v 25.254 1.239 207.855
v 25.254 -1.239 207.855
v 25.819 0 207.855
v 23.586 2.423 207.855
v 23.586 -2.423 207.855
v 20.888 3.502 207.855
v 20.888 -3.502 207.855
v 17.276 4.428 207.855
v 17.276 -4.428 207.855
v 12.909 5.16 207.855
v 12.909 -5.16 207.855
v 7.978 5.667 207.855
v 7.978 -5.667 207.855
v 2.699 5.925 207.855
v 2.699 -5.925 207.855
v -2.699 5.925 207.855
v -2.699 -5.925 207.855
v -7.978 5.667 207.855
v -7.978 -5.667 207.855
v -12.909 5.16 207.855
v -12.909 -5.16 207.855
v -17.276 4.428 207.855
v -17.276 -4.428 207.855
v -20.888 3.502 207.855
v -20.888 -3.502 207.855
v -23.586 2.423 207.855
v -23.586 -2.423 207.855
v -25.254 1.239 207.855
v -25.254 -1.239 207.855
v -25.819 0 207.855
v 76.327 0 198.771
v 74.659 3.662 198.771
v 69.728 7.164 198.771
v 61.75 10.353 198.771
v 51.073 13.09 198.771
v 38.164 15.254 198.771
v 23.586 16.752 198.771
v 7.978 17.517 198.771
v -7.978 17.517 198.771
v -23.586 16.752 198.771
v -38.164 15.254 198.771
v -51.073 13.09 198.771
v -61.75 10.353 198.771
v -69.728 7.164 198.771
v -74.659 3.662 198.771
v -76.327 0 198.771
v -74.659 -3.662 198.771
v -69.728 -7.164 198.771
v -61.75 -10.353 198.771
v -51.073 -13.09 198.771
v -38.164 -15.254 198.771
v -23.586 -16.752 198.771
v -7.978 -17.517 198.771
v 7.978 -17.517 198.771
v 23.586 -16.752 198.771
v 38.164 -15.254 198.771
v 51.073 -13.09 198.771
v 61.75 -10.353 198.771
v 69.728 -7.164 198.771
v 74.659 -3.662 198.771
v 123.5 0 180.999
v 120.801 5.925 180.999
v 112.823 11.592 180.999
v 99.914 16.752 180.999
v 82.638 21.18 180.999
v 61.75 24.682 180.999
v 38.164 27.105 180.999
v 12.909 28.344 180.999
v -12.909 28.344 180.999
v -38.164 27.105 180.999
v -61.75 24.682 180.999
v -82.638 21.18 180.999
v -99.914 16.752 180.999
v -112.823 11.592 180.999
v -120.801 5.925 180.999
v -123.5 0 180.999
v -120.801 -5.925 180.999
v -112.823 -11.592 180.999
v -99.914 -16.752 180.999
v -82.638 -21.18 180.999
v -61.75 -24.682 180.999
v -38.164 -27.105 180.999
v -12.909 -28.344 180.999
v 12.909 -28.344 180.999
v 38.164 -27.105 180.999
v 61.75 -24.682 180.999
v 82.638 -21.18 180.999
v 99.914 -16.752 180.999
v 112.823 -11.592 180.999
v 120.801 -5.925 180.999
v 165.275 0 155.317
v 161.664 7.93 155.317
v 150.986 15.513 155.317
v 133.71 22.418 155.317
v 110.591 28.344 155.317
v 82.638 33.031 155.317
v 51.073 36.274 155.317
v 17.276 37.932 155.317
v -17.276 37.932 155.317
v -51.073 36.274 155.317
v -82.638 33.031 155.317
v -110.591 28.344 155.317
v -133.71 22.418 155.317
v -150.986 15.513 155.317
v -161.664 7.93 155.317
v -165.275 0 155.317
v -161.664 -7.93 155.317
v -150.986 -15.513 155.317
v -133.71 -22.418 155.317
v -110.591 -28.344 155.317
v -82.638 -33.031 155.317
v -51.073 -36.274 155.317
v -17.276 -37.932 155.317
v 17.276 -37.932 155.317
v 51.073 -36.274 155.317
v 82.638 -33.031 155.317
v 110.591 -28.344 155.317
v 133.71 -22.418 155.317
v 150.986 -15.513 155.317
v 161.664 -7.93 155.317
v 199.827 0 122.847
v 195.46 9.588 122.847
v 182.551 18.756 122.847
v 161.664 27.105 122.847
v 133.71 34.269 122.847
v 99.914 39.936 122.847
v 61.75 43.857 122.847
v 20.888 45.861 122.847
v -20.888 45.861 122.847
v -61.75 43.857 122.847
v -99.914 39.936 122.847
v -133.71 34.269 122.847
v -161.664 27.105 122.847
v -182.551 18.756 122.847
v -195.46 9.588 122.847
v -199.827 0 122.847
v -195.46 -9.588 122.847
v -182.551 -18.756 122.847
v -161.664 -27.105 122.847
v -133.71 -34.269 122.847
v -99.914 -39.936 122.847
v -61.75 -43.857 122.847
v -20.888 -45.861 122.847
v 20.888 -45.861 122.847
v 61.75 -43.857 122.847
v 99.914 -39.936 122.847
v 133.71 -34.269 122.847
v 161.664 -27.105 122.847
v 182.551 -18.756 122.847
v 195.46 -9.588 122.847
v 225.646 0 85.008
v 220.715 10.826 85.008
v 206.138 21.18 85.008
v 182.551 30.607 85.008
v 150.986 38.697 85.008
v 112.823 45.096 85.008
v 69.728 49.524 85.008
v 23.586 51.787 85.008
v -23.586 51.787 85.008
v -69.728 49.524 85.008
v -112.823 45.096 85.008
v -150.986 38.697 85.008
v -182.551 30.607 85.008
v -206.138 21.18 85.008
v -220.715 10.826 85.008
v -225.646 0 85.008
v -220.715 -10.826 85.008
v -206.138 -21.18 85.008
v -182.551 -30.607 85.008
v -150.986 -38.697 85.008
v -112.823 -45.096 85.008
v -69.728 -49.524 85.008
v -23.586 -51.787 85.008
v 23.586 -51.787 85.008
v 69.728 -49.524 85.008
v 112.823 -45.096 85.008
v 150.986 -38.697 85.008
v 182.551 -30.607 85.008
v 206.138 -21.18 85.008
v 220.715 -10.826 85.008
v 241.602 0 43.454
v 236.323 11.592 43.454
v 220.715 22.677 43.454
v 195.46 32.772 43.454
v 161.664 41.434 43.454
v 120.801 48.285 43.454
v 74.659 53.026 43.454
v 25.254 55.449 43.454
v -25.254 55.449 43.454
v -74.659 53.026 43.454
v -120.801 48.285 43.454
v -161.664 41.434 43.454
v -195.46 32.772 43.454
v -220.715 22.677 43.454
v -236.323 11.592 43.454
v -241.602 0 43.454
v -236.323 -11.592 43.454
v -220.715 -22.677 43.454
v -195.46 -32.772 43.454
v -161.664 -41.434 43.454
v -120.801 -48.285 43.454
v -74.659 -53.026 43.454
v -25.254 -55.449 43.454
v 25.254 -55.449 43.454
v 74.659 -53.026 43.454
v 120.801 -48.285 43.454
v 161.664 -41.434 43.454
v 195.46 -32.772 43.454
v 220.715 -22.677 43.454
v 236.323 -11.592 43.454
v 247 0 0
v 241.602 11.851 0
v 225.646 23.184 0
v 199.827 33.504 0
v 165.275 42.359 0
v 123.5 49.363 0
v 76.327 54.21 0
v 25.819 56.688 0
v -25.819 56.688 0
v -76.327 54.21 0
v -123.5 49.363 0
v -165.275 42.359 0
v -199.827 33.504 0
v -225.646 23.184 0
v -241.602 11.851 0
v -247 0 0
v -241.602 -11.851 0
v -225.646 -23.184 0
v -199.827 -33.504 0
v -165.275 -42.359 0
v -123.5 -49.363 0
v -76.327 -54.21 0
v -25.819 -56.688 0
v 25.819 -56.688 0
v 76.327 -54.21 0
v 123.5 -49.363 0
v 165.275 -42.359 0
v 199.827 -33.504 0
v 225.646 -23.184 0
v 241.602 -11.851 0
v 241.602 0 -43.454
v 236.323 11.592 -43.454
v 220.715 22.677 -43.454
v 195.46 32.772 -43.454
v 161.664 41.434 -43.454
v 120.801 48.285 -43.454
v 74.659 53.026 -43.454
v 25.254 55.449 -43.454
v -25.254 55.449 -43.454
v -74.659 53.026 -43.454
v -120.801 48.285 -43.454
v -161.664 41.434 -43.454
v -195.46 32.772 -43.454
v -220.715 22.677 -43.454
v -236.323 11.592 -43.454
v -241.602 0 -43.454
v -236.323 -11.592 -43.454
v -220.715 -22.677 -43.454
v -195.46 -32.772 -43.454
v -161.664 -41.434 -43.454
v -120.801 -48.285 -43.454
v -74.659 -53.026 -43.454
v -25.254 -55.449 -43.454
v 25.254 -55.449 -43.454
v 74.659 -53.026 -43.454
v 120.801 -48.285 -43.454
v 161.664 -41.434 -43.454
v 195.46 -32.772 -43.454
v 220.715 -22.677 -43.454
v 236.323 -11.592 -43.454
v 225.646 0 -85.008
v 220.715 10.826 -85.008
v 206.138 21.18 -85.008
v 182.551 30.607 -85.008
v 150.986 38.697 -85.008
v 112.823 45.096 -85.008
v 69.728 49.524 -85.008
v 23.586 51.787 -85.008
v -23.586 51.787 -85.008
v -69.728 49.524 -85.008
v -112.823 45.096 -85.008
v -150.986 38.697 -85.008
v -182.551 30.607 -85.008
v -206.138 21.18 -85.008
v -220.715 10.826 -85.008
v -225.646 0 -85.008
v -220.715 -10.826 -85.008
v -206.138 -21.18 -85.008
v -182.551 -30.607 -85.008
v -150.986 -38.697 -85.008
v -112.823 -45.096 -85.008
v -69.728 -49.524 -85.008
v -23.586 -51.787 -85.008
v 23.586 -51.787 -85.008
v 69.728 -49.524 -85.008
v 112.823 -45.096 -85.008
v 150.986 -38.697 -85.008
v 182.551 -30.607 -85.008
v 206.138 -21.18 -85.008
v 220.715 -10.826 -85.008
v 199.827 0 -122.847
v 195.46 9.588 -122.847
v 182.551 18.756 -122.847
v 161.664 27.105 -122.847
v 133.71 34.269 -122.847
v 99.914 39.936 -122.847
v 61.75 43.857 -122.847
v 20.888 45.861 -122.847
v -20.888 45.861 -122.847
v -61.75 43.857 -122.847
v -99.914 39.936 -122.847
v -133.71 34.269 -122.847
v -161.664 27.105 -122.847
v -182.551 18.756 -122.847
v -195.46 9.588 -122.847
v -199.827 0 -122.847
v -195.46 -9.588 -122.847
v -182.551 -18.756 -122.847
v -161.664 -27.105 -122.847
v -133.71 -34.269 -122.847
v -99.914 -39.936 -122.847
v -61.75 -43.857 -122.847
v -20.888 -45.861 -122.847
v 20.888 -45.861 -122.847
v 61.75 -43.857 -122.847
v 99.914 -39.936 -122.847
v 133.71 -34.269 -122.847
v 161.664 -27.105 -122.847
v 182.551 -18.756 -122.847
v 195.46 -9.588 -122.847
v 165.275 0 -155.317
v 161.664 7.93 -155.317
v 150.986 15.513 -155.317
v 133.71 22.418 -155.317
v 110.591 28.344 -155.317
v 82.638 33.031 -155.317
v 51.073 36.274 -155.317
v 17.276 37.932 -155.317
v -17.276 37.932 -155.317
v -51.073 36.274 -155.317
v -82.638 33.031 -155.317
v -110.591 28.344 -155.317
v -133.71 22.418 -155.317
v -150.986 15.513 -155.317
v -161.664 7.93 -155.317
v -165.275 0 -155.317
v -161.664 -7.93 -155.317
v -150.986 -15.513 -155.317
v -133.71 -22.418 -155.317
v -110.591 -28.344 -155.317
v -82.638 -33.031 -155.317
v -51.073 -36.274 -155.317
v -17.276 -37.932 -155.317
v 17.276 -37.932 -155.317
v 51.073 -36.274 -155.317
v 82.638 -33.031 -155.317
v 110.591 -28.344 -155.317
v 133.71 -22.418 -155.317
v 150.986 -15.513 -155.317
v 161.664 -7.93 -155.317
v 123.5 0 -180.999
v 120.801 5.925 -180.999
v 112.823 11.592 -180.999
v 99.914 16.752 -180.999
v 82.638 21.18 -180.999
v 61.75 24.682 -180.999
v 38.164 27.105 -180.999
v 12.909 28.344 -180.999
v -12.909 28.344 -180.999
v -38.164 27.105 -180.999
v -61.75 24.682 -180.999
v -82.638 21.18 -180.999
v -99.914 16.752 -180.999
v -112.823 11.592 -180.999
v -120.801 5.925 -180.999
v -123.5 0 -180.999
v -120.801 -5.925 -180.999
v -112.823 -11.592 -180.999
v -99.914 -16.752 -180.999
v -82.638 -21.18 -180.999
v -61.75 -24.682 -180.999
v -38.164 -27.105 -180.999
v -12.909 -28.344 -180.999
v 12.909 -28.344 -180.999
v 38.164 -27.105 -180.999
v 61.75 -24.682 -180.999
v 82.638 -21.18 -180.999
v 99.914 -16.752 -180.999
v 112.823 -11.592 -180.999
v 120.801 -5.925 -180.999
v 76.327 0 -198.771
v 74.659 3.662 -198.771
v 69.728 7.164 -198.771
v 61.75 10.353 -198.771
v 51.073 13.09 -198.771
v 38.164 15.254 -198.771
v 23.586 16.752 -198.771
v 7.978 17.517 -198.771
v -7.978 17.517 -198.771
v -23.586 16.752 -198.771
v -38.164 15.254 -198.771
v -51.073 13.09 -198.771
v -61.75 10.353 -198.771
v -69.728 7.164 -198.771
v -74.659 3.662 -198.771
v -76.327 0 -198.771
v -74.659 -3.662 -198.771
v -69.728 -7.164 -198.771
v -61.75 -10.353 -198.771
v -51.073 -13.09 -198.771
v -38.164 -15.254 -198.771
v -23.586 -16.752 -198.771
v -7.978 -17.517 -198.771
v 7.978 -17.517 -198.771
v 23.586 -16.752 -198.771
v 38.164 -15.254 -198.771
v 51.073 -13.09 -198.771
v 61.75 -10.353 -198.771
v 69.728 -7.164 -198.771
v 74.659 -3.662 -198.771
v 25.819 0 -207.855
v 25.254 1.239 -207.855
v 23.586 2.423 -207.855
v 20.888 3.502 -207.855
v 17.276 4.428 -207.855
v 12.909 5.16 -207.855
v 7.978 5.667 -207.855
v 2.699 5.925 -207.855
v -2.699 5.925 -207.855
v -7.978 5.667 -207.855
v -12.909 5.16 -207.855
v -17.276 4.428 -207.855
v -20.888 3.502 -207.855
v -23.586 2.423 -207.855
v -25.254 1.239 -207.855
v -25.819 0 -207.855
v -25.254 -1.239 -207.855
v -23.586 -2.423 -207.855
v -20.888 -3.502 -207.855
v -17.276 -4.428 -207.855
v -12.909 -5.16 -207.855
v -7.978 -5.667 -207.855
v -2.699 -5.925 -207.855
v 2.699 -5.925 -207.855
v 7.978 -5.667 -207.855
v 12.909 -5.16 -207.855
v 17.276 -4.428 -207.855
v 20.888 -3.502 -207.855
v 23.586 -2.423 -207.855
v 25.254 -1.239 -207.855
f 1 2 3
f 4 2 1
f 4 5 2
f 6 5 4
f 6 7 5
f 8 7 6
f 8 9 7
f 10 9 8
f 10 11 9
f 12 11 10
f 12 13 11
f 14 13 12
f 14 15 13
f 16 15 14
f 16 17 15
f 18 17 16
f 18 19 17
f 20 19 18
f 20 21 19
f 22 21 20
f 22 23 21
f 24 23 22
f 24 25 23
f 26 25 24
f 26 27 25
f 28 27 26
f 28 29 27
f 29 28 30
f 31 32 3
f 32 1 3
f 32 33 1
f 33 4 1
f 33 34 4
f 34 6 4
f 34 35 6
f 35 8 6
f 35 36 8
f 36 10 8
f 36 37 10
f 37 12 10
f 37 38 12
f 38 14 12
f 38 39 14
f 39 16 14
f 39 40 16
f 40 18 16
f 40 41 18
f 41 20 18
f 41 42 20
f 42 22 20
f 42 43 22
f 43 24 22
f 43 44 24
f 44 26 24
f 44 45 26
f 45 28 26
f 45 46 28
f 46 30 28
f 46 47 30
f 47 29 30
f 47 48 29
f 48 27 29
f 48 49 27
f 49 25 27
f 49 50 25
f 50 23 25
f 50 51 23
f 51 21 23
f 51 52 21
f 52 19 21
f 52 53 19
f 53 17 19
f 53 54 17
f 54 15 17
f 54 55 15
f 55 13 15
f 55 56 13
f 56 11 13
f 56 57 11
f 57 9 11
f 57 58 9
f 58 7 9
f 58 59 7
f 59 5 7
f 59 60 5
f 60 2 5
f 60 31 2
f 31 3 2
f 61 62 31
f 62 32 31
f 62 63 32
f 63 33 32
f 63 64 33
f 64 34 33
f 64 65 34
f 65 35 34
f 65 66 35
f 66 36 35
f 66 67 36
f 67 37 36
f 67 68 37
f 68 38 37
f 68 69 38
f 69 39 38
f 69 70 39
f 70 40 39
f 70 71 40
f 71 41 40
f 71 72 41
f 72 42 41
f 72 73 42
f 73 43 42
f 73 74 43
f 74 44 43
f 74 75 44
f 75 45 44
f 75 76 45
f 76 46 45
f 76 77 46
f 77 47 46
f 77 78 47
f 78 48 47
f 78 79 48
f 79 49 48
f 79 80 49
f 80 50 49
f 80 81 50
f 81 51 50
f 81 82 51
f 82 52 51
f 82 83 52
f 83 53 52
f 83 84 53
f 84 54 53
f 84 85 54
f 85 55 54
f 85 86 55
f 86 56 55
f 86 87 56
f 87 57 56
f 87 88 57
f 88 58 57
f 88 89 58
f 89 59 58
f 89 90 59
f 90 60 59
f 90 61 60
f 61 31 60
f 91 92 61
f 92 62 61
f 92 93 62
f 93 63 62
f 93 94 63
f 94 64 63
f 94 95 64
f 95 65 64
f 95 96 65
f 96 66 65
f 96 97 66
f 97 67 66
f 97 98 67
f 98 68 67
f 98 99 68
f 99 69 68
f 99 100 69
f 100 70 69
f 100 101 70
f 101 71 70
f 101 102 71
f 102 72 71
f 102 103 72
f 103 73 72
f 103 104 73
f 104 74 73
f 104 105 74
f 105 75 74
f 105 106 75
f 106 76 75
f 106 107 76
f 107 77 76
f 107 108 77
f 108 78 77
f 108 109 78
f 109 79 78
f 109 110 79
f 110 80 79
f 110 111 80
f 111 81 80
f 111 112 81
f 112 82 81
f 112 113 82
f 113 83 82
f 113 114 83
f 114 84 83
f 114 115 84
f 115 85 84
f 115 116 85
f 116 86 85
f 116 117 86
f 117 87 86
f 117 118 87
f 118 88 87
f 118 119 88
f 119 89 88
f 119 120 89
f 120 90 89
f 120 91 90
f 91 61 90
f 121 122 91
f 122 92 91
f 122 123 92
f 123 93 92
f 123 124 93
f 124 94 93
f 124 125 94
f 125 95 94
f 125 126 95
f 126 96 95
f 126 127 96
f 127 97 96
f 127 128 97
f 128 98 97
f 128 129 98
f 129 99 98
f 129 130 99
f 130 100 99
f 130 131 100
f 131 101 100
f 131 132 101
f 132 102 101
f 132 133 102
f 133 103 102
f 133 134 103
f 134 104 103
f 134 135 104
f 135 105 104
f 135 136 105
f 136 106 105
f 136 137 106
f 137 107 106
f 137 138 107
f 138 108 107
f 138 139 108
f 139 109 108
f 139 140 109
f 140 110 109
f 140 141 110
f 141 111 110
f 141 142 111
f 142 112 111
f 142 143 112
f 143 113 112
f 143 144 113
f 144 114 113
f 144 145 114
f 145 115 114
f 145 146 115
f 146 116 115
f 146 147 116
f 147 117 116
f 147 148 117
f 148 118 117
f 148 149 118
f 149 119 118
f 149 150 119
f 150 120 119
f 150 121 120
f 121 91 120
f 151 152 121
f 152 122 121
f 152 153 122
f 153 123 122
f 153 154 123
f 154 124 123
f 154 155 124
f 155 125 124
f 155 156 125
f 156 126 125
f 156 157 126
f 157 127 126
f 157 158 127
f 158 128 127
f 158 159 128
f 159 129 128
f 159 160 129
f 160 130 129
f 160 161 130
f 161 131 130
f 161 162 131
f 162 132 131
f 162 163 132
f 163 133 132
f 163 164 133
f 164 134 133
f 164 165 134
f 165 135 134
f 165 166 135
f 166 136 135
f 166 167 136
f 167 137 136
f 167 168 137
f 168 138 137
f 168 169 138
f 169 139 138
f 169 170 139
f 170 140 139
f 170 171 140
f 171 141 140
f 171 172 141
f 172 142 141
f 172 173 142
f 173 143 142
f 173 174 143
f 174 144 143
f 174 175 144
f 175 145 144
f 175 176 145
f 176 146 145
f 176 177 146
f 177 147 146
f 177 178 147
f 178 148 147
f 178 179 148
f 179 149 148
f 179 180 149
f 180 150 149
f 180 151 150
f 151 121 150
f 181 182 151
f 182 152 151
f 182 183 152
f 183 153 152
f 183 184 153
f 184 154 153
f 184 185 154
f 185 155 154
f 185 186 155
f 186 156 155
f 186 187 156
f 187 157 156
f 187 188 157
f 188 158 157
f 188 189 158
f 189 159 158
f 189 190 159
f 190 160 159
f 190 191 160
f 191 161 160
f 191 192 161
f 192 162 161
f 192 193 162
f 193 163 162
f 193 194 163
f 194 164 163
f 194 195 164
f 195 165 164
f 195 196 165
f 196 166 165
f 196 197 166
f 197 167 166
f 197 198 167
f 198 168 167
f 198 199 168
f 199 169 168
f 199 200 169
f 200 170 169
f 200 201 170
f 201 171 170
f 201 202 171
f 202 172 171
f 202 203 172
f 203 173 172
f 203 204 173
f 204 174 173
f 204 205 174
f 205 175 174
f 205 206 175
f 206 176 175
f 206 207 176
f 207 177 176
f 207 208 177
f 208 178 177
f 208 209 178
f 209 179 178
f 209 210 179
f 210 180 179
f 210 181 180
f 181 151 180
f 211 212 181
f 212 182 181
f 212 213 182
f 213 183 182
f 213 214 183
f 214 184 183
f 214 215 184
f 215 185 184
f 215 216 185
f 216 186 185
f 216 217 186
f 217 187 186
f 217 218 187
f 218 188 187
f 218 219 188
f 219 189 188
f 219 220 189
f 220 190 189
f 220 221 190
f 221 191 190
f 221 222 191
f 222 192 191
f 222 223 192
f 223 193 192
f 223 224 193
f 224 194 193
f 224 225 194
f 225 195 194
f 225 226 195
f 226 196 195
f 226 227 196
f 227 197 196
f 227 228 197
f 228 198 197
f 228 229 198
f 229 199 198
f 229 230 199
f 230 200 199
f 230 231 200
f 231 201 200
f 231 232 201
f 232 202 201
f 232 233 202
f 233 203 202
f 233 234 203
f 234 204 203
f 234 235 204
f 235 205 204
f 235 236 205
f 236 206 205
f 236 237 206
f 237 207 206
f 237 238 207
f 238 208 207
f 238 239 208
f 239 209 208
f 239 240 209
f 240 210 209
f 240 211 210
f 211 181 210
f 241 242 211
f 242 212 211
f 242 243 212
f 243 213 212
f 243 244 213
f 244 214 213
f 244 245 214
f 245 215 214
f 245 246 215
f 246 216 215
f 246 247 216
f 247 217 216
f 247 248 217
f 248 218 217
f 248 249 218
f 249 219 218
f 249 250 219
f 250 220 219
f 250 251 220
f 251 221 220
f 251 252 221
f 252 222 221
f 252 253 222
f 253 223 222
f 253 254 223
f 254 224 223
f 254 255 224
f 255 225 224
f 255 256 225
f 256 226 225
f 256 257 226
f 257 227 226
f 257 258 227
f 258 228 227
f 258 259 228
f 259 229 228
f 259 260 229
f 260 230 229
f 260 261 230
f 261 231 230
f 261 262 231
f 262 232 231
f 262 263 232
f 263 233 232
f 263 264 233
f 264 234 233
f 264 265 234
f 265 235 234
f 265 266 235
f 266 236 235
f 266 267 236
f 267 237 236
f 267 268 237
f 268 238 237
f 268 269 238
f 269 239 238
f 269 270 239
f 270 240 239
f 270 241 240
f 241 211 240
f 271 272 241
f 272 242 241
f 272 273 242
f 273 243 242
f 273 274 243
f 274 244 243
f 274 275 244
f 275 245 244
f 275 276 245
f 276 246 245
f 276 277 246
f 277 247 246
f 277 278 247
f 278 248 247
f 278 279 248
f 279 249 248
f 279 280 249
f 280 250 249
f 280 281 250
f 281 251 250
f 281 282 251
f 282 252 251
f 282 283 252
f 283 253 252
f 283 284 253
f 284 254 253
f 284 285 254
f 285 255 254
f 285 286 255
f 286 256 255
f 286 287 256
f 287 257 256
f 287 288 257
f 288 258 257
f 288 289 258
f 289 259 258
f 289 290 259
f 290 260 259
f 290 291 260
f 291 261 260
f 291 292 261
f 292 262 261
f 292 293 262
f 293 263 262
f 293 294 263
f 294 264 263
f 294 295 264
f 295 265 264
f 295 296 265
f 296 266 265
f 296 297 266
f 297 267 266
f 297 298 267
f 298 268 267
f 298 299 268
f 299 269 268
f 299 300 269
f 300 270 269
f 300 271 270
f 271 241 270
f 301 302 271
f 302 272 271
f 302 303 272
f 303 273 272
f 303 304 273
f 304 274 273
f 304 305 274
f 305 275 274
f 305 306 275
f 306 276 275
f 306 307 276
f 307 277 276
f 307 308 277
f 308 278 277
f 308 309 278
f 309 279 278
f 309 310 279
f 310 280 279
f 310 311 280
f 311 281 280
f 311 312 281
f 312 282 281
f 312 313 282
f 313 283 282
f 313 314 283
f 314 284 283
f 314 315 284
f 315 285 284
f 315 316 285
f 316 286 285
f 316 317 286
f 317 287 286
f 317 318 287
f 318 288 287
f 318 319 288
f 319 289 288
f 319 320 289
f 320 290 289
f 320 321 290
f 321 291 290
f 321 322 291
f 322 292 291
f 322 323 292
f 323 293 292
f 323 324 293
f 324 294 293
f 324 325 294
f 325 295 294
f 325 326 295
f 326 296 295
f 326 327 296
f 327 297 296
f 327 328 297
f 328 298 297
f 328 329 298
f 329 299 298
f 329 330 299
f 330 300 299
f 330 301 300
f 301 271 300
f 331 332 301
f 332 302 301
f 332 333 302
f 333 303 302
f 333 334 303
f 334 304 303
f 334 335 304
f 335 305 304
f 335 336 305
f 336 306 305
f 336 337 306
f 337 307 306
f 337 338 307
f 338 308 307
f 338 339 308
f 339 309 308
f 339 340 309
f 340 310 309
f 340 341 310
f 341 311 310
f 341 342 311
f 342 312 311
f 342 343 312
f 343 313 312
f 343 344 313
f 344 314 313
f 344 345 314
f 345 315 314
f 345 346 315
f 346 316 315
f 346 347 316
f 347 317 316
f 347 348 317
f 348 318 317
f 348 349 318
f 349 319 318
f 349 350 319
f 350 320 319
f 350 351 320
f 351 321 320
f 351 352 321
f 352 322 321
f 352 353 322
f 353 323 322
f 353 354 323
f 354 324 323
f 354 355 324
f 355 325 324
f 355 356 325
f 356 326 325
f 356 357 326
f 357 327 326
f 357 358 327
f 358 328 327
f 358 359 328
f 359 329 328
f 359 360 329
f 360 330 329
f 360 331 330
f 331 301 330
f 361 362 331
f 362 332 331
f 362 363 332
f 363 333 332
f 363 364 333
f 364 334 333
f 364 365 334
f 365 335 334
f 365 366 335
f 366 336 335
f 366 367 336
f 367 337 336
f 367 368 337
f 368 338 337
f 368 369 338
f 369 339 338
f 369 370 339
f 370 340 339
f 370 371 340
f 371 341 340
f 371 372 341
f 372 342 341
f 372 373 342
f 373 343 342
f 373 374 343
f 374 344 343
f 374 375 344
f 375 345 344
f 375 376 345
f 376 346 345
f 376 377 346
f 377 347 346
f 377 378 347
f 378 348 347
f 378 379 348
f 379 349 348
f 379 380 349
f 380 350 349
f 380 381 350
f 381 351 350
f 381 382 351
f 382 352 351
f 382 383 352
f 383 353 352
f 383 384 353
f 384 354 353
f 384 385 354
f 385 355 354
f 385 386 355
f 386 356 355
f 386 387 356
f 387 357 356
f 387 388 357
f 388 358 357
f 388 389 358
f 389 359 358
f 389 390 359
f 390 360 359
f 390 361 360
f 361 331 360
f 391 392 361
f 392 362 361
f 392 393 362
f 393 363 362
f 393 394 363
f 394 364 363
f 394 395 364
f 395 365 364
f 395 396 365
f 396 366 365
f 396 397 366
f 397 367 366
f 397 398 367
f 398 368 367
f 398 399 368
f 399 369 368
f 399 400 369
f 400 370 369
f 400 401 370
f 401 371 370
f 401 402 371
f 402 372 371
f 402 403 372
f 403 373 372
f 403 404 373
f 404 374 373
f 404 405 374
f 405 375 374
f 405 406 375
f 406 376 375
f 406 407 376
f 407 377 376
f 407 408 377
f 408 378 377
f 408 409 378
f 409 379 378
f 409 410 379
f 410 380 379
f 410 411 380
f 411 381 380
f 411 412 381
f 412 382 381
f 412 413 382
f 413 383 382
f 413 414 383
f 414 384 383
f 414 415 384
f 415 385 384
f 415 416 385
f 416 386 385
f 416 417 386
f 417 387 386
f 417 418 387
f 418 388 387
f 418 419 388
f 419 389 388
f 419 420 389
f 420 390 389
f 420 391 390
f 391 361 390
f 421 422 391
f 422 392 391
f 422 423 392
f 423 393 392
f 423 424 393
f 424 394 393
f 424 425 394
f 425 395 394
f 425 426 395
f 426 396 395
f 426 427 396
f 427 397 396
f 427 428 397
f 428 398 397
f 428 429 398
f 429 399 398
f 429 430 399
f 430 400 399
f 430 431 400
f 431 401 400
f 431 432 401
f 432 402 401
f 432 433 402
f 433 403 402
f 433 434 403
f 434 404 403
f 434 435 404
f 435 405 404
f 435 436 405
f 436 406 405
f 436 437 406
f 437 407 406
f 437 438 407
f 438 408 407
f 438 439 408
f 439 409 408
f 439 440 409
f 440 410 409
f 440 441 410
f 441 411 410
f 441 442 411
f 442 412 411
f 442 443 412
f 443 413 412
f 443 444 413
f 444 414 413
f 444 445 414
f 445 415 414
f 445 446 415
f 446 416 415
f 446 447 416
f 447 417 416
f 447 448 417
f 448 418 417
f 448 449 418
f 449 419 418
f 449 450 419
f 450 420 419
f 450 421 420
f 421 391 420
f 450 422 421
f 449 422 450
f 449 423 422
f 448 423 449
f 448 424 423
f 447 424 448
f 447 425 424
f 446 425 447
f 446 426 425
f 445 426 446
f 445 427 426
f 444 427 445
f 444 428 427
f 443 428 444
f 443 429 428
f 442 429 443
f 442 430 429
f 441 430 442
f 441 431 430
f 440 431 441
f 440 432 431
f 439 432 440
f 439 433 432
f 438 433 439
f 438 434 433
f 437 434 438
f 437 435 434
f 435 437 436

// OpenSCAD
// Generated by SolidPython 1.0.1 on 2020-07-29 00:46:50


scale(v = [13, 3, 11]) {
	sphere(r = 19);
}
/***********************************************
*********      SolidPython code:      **********
************************************************
 
# import packages: SolidPython
from solid import *
from solid.utils import *
from itertools import chain, combinations, permutations


class Resize:

    def __init__(self, scad_file):
        self.scad_file = scad_file
        #self.scad_file = import_scad(scad_file)
        # cone/cylinder param:
        self.r1 = 0
        self.r2 = 0
        self.h = 0
        # rectangular prism param:
        self.w = 0
        self.l = 0
        # ellipse param:
        self.r = 0

    # import OpenScad code (file name corresponds to shape)


    # classify shape + parameters
    def assign(self, param1, param2, param3):
        if self.scad_file == 'cone.scad':
            self.r1 = param1
            self.r2 = param2
            self.h = param3
        elif self.scad_file == 'cylinder.scad':
            self.r1 = param1
            self.r2 = param2
            self.h = param3
        elif self.scad_file == 'rectangularPrism.scad':
            self.h = param1
            self.l = param2
            self.w = param3
        else:
            self.r = param1
            self.h = param2

    # resize parameters
    def iterate(self):
        x = range(3, 20, 2)
        i = 1
        if self.scad_file == 'cone.scad':
            tempList = list(permutations(x, 2))
            for temp in tempList:
                param1 = temp[0]
                param2 = temp[1]
                filepath = 'produced_scad_files/' + 'cone' + str(param1) + '_' + str(param2) + '_' + '.scad'
                scad_render_to_file(cylinder(h=param1, r1=param2, r2=0), filepath)

        elif self.scad_file == 'cylinder.scad':
            tempList = list(permutations(x, 3))
            for temp in tempList:
                param1 = temp[0]
                param2 = temp[1]
                filepath = 'produced_scad_files/' + 'cylinder' + str(param1) + '_' + str(param2) + '_' + '.scad'
                scad_render_to_file(cylinder(h=param1, r1=param2, r2=param2), filepath)

        elif self.scad_file == 'rectangularPrism.scad':
            tempList = list(permutations(x, 3))
            for temp in tempList:
                param1 = temp[0]
                param2 = temp[1]
                param3 = temp[2]
                filepath = 'produced_scad_files/' + 'rectangularPrism' + str(param1) + '_' + str(param2) + '_' + str(
                    param3) + '.scad'
                scad_render_to_file(cube(size=(param1, param2, param3)), filepath)

        elif self.scad_file == 'ellipse.scad':
            tempList = list(permutations(x, 4))
            for temp in tempList:
                param1 = temp[0]
                param2 = temp[1]
                param3 = temp[2]
                param4 = temp[3]
                filepath = 'produced_scad_files/' + 'ellipse' + str(param1) + '_' + str(param2) + '_' + str(param3) + '_' + str(param4) + '.scad'
                scad_render_to_file(scale([param1, param2, param3])(sphere(r=param4)), filepath)

    def render_to_scadfile(self):
        scad_render_to_file(scad, 'example.scad') 
 
************************************************/
